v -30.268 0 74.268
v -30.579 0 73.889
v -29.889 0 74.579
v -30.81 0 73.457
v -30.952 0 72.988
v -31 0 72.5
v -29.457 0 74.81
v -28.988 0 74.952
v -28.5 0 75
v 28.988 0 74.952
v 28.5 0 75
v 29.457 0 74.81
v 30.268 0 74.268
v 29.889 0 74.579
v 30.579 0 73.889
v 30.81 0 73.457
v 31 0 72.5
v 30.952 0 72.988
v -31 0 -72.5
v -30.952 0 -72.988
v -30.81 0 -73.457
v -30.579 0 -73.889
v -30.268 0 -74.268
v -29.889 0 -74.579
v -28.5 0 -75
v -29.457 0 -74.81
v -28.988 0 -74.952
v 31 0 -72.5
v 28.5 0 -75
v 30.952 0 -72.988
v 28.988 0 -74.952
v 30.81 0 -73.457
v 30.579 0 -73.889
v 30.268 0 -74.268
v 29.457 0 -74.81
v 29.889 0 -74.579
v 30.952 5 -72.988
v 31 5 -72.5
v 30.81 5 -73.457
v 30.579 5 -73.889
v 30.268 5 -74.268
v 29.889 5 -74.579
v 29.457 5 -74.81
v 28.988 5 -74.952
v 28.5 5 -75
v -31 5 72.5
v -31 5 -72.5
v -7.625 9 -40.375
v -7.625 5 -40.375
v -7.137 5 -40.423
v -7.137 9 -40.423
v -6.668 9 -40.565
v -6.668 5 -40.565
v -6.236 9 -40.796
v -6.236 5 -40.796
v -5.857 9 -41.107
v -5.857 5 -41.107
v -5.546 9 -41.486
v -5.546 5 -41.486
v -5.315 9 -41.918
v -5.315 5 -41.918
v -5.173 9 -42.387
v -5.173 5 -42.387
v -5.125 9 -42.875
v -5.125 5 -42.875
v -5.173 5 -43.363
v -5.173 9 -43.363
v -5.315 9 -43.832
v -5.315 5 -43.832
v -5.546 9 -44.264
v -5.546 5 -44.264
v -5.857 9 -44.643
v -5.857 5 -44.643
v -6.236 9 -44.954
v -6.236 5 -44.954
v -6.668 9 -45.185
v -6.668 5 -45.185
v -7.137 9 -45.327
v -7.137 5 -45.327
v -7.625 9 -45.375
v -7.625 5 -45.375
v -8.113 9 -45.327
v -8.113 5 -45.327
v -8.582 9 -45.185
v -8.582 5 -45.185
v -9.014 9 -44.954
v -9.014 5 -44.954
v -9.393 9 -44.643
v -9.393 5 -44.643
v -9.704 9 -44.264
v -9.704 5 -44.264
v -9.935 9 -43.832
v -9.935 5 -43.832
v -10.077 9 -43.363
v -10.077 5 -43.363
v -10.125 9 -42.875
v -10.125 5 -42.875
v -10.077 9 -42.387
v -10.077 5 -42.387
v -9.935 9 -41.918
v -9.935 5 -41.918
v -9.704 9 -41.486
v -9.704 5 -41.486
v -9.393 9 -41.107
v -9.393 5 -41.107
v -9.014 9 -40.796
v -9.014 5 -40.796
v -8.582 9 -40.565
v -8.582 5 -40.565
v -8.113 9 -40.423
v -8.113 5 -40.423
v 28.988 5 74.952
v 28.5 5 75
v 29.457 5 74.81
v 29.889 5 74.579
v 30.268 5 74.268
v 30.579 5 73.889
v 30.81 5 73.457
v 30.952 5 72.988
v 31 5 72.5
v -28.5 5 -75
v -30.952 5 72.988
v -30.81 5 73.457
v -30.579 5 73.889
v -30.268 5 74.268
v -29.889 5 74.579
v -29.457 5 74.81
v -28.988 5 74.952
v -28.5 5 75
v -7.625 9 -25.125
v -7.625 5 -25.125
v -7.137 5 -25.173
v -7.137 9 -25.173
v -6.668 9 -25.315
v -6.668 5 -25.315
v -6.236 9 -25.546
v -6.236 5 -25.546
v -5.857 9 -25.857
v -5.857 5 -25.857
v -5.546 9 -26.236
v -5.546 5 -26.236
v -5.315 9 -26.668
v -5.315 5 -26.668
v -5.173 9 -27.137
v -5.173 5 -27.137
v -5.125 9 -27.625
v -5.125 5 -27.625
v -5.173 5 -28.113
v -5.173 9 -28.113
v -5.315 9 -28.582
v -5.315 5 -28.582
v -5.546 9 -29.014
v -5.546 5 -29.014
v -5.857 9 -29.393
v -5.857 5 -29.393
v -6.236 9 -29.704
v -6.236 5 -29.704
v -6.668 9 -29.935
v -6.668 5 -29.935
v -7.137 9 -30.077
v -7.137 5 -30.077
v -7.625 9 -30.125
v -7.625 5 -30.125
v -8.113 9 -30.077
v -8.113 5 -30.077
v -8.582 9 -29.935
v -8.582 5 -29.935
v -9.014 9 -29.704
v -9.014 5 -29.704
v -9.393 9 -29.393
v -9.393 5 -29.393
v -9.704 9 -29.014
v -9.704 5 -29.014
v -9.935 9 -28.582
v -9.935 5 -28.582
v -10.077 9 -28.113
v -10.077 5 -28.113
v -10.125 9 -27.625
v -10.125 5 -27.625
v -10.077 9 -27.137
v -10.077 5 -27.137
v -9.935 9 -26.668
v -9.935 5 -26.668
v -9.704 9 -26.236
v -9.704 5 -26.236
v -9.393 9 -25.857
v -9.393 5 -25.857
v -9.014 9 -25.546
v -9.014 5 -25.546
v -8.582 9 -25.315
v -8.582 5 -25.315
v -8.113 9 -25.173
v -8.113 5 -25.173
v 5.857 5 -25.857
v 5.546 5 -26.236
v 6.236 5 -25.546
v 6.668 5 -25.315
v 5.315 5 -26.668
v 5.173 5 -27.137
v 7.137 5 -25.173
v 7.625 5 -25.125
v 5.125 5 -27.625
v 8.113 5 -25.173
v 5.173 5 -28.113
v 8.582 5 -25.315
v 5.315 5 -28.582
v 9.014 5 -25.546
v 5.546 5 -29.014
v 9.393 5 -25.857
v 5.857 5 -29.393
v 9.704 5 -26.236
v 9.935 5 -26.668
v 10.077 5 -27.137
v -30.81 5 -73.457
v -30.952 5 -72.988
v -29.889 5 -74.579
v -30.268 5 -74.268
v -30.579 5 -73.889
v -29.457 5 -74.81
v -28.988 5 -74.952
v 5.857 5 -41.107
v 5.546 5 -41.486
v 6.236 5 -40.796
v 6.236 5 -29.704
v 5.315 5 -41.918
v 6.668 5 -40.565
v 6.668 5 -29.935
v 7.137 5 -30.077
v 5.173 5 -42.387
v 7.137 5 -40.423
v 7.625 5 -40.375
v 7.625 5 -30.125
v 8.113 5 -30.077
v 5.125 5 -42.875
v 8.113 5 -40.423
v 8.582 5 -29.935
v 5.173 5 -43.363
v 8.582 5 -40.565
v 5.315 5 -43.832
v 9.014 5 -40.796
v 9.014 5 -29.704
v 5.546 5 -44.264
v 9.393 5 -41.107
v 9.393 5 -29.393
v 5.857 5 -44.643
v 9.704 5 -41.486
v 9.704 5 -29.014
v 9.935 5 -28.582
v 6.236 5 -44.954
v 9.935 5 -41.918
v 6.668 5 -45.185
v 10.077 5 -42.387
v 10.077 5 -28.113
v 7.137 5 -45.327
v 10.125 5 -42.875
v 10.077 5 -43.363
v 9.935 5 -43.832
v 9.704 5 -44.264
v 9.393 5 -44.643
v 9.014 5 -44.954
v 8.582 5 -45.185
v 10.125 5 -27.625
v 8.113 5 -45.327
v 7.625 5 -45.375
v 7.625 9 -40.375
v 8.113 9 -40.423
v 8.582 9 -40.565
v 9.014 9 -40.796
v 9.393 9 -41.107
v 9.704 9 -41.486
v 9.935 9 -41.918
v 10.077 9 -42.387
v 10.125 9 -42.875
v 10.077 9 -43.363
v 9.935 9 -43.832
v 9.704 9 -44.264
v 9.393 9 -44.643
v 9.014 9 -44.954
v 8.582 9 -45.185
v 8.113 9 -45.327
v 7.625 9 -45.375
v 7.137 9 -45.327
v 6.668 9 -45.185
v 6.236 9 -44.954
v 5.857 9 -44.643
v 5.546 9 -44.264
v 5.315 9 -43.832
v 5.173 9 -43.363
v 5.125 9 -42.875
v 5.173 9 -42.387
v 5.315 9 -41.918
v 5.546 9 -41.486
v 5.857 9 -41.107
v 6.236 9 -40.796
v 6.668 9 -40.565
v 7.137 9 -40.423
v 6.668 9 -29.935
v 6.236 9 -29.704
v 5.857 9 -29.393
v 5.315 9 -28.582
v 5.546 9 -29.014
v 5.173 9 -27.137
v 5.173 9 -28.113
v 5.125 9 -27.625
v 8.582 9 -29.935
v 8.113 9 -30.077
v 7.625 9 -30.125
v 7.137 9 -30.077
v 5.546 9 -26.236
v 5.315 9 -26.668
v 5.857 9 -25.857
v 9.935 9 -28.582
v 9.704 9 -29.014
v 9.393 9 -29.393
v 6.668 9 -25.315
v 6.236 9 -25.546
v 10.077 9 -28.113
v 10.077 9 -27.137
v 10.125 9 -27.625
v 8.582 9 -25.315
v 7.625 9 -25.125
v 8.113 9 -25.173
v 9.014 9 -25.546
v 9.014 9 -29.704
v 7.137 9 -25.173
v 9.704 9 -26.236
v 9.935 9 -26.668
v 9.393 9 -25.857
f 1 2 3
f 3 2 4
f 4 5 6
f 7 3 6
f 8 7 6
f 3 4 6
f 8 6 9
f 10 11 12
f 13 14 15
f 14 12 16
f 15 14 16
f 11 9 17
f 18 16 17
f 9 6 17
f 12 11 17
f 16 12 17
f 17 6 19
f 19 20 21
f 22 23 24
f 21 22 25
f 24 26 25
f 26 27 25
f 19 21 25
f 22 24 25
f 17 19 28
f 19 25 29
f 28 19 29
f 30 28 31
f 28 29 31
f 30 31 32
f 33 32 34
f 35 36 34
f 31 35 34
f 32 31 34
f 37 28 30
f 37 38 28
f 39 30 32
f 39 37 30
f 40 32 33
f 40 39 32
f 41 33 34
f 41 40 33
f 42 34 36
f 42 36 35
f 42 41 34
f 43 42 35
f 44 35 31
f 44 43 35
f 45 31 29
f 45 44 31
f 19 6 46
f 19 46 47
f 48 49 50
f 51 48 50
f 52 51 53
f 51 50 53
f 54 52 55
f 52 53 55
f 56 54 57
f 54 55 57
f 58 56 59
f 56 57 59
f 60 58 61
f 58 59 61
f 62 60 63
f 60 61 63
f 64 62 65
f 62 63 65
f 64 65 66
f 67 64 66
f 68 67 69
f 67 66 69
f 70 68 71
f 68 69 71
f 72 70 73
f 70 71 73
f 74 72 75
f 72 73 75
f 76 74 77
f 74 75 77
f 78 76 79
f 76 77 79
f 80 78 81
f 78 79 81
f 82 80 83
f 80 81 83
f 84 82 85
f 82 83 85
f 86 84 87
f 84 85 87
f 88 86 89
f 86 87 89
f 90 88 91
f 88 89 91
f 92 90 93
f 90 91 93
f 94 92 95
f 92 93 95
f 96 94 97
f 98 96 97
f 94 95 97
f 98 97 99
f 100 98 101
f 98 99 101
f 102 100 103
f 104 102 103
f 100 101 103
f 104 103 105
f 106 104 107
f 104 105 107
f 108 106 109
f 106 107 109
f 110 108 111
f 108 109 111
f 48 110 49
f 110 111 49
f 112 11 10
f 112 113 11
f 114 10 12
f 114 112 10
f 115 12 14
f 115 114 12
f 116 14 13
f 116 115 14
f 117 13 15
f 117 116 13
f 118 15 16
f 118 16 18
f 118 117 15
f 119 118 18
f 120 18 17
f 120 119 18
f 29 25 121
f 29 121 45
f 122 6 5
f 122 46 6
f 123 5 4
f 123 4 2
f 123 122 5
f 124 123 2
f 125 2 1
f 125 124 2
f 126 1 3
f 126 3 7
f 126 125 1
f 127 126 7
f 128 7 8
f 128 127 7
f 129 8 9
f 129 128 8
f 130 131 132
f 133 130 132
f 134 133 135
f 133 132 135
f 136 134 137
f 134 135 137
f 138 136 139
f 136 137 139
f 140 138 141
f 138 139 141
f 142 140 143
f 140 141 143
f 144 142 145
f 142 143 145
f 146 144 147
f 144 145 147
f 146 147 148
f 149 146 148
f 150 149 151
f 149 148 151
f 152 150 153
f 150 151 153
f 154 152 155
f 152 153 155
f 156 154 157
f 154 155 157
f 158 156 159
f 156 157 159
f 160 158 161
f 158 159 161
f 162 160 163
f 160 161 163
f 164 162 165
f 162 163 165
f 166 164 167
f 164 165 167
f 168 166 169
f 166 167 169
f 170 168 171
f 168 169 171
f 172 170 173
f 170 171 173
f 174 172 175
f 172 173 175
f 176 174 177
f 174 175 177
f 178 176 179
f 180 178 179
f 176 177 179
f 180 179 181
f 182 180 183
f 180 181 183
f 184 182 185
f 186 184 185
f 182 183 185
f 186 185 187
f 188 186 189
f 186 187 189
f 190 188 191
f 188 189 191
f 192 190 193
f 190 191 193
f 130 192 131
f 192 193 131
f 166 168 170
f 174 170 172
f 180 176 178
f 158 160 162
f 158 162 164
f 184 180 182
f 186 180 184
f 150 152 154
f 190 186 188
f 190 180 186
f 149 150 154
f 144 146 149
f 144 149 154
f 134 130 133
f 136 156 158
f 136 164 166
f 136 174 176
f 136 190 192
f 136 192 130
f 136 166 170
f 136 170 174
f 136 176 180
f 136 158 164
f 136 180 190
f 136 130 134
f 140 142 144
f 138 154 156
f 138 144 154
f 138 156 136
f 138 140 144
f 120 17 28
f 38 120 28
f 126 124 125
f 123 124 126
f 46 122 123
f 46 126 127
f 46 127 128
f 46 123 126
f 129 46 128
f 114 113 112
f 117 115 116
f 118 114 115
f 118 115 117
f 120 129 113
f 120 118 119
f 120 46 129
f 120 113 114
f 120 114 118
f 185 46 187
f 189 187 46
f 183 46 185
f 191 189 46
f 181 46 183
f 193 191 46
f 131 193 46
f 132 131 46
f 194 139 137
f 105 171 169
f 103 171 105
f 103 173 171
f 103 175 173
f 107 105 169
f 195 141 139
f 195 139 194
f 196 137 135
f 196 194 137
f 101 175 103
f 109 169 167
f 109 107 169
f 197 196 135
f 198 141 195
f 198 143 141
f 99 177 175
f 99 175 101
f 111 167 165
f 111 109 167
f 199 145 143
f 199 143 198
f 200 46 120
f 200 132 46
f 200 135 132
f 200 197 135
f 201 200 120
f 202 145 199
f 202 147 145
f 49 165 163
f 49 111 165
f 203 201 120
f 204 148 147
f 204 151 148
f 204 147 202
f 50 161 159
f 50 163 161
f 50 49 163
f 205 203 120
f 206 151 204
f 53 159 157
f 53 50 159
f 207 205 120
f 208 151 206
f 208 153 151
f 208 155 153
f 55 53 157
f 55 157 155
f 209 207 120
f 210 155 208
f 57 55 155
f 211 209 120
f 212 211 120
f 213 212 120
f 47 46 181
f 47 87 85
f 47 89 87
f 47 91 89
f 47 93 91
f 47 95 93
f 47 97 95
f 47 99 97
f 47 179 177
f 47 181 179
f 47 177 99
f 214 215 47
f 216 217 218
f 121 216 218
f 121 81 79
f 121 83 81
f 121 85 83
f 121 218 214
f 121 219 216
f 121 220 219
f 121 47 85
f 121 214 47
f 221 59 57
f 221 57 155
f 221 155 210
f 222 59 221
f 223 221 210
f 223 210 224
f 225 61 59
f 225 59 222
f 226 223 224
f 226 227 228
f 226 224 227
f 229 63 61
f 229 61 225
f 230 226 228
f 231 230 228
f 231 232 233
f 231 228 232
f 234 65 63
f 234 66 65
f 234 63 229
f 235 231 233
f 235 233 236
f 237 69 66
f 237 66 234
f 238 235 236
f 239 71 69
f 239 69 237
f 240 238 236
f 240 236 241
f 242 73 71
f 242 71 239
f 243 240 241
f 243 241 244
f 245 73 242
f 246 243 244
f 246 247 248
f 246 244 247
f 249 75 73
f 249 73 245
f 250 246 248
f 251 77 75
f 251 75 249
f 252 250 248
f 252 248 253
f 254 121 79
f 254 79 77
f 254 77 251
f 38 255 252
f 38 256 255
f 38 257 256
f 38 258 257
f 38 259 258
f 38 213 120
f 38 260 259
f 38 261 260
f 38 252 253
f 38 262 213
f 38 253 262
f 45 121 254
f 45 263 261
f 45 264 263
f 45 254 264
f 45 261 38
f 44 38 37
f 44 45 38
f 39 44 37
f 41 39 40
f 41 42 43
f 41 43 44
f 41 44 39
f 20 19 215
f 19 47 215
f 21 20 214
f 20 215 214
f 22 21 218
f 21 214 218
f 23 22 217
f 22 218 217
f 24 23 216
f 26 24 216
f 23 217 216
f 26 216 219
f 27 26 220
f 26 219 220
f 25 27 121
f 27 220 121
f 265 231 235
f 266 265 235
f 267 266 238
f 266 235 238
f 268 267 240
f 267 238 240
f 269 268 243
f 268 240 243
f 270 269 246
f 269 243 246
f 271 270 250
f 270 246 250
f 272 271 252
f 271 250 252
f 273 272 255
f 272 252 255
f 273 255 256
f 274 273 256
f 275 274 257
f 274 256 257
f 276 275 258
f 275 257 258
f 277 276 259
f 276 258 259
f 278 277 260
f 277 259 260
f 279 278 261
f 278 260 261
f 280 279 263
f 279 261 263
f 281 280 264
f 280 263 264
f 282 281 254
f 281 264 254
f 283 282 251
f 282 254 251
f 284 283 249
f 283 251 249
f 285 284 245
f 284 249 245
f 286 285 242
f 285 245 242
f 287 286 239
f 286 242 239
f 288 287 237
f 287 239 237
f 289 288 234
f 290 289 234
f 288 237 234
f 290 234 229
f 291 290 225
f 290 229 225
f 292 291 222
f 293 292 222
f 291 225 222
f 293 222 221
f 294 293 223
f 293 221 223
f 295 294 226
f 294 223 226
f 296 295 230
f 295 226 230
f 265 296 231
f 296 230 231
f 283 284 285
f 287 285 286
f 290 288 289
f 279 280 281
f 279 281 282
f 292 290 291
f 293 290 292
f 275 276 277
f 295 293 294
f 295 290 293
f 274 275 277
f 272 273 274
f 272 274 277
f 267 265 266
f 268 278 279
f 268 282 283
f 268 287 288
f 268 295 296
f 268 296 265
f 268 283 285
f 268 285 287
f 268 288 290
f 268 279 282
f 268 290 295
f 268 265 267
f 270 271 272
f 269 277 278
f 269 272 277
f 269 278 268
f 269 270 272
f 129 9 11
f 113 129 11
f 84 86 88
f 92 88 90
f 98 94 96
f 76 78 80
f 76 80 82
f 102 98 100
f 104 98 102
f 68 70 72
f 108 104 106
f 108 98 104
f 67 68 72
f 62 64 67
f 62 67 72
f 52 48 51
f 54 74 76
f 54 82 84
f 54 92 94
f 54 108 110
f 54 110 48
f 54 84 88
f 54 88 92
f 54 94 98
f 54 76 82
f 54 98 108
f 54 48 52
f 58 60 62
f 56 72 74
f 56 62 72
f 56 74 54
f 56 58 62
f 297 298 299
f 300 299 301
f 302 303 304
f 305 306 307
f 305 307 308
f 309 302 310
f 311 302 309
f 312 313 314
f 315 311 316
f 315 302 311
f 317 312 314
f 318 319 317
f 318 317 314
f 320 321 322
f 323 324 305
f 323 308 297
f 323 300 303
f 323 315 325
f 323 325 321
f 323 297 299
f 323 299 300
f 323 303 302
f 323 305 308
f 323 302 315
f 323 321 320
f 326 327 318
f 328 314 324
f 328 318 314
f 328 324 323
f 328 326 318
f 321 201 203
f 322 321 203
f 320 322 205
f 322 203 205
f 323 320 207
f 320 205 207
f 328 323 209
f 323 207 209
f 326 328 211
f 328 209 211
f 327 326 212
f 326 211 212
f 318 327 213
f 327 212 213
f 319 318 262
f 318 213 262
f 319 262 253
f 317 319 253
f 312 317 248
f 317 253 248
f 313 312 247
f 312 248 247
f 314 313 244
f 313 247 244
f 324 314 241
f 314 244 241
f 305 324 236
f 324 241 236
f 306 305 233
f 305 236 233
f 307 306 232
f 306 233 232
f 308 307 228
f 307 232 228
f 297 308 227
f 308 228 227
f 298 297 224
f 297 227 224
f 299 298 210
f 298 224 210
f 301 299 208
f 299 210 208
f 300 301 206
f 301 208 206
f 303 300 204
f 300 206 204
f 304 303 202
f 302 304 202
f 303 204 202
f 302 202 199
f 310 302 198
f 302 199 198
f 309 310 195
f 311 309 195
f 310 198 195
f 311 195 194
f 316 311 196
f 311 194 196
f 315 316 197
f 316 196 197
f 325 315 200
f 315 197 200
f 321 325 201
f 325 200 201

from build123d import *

# Parameters (mm, degrees)
SKETCH1_W           = 62
SKETCH1_H           = 150
BOSS_EXTRUDE1_DEPTH = 5
FILLET1_R           = 2.5
SKETCH3_R           = 2.5
BOSS_EXTRUDE2_DEPTH = 4


with BuildPart() as part:
    # Sketch1 → Boss-Extrude1 (new body)
    with BuildSketch(Plane(origin=(0, 0, 0), x_dir=(1, 0, 0), z_dir=(0, 1, 0))):
        Rectangle(SKETCH1_W, SKETCH1_H)
    extrude(amount=BOSS_EXTRUDE1_DEPTH)

    # Fillet1
    fillet1_edges = [part.edges().sort_by_distance(p)[0] for p in [
        (31, 2.5, 75),
        (-31, 2.5, 75),
        (-31, 2.5, -75),
        (31, 2.5, -75),
    ]]
    fillet(fillet1_edges, radius=FILLET1_R)

    # Sketch3 → Boss-Extrude2 (add)
    with BuildSketch(Plane(origin=(0, 5, 0), x_dir=(1, 0, 0), z_dir=(0, 1, 0))):
        with Locations(Location((-7.625, 42.875, 0), (0, 0, 270))):
            Circle(SKETCH3_R)
        with Locations(Location((7.625, 42.875, 0), (0, 0, 270))):
            Circle(SKETCH3_R)
        with Locations(Location((7.625, 27.625, 0), (0, 0, 270))):
            Circle(SKETCH3_R)
        with Locations(Location((-7.625, 27.625, 0), (0, 0, 270))):
            Circle(SKETCH3_R)
    extrude(amount=BOSS_EXTRUDE2_DEPTH)


solid = part.part
